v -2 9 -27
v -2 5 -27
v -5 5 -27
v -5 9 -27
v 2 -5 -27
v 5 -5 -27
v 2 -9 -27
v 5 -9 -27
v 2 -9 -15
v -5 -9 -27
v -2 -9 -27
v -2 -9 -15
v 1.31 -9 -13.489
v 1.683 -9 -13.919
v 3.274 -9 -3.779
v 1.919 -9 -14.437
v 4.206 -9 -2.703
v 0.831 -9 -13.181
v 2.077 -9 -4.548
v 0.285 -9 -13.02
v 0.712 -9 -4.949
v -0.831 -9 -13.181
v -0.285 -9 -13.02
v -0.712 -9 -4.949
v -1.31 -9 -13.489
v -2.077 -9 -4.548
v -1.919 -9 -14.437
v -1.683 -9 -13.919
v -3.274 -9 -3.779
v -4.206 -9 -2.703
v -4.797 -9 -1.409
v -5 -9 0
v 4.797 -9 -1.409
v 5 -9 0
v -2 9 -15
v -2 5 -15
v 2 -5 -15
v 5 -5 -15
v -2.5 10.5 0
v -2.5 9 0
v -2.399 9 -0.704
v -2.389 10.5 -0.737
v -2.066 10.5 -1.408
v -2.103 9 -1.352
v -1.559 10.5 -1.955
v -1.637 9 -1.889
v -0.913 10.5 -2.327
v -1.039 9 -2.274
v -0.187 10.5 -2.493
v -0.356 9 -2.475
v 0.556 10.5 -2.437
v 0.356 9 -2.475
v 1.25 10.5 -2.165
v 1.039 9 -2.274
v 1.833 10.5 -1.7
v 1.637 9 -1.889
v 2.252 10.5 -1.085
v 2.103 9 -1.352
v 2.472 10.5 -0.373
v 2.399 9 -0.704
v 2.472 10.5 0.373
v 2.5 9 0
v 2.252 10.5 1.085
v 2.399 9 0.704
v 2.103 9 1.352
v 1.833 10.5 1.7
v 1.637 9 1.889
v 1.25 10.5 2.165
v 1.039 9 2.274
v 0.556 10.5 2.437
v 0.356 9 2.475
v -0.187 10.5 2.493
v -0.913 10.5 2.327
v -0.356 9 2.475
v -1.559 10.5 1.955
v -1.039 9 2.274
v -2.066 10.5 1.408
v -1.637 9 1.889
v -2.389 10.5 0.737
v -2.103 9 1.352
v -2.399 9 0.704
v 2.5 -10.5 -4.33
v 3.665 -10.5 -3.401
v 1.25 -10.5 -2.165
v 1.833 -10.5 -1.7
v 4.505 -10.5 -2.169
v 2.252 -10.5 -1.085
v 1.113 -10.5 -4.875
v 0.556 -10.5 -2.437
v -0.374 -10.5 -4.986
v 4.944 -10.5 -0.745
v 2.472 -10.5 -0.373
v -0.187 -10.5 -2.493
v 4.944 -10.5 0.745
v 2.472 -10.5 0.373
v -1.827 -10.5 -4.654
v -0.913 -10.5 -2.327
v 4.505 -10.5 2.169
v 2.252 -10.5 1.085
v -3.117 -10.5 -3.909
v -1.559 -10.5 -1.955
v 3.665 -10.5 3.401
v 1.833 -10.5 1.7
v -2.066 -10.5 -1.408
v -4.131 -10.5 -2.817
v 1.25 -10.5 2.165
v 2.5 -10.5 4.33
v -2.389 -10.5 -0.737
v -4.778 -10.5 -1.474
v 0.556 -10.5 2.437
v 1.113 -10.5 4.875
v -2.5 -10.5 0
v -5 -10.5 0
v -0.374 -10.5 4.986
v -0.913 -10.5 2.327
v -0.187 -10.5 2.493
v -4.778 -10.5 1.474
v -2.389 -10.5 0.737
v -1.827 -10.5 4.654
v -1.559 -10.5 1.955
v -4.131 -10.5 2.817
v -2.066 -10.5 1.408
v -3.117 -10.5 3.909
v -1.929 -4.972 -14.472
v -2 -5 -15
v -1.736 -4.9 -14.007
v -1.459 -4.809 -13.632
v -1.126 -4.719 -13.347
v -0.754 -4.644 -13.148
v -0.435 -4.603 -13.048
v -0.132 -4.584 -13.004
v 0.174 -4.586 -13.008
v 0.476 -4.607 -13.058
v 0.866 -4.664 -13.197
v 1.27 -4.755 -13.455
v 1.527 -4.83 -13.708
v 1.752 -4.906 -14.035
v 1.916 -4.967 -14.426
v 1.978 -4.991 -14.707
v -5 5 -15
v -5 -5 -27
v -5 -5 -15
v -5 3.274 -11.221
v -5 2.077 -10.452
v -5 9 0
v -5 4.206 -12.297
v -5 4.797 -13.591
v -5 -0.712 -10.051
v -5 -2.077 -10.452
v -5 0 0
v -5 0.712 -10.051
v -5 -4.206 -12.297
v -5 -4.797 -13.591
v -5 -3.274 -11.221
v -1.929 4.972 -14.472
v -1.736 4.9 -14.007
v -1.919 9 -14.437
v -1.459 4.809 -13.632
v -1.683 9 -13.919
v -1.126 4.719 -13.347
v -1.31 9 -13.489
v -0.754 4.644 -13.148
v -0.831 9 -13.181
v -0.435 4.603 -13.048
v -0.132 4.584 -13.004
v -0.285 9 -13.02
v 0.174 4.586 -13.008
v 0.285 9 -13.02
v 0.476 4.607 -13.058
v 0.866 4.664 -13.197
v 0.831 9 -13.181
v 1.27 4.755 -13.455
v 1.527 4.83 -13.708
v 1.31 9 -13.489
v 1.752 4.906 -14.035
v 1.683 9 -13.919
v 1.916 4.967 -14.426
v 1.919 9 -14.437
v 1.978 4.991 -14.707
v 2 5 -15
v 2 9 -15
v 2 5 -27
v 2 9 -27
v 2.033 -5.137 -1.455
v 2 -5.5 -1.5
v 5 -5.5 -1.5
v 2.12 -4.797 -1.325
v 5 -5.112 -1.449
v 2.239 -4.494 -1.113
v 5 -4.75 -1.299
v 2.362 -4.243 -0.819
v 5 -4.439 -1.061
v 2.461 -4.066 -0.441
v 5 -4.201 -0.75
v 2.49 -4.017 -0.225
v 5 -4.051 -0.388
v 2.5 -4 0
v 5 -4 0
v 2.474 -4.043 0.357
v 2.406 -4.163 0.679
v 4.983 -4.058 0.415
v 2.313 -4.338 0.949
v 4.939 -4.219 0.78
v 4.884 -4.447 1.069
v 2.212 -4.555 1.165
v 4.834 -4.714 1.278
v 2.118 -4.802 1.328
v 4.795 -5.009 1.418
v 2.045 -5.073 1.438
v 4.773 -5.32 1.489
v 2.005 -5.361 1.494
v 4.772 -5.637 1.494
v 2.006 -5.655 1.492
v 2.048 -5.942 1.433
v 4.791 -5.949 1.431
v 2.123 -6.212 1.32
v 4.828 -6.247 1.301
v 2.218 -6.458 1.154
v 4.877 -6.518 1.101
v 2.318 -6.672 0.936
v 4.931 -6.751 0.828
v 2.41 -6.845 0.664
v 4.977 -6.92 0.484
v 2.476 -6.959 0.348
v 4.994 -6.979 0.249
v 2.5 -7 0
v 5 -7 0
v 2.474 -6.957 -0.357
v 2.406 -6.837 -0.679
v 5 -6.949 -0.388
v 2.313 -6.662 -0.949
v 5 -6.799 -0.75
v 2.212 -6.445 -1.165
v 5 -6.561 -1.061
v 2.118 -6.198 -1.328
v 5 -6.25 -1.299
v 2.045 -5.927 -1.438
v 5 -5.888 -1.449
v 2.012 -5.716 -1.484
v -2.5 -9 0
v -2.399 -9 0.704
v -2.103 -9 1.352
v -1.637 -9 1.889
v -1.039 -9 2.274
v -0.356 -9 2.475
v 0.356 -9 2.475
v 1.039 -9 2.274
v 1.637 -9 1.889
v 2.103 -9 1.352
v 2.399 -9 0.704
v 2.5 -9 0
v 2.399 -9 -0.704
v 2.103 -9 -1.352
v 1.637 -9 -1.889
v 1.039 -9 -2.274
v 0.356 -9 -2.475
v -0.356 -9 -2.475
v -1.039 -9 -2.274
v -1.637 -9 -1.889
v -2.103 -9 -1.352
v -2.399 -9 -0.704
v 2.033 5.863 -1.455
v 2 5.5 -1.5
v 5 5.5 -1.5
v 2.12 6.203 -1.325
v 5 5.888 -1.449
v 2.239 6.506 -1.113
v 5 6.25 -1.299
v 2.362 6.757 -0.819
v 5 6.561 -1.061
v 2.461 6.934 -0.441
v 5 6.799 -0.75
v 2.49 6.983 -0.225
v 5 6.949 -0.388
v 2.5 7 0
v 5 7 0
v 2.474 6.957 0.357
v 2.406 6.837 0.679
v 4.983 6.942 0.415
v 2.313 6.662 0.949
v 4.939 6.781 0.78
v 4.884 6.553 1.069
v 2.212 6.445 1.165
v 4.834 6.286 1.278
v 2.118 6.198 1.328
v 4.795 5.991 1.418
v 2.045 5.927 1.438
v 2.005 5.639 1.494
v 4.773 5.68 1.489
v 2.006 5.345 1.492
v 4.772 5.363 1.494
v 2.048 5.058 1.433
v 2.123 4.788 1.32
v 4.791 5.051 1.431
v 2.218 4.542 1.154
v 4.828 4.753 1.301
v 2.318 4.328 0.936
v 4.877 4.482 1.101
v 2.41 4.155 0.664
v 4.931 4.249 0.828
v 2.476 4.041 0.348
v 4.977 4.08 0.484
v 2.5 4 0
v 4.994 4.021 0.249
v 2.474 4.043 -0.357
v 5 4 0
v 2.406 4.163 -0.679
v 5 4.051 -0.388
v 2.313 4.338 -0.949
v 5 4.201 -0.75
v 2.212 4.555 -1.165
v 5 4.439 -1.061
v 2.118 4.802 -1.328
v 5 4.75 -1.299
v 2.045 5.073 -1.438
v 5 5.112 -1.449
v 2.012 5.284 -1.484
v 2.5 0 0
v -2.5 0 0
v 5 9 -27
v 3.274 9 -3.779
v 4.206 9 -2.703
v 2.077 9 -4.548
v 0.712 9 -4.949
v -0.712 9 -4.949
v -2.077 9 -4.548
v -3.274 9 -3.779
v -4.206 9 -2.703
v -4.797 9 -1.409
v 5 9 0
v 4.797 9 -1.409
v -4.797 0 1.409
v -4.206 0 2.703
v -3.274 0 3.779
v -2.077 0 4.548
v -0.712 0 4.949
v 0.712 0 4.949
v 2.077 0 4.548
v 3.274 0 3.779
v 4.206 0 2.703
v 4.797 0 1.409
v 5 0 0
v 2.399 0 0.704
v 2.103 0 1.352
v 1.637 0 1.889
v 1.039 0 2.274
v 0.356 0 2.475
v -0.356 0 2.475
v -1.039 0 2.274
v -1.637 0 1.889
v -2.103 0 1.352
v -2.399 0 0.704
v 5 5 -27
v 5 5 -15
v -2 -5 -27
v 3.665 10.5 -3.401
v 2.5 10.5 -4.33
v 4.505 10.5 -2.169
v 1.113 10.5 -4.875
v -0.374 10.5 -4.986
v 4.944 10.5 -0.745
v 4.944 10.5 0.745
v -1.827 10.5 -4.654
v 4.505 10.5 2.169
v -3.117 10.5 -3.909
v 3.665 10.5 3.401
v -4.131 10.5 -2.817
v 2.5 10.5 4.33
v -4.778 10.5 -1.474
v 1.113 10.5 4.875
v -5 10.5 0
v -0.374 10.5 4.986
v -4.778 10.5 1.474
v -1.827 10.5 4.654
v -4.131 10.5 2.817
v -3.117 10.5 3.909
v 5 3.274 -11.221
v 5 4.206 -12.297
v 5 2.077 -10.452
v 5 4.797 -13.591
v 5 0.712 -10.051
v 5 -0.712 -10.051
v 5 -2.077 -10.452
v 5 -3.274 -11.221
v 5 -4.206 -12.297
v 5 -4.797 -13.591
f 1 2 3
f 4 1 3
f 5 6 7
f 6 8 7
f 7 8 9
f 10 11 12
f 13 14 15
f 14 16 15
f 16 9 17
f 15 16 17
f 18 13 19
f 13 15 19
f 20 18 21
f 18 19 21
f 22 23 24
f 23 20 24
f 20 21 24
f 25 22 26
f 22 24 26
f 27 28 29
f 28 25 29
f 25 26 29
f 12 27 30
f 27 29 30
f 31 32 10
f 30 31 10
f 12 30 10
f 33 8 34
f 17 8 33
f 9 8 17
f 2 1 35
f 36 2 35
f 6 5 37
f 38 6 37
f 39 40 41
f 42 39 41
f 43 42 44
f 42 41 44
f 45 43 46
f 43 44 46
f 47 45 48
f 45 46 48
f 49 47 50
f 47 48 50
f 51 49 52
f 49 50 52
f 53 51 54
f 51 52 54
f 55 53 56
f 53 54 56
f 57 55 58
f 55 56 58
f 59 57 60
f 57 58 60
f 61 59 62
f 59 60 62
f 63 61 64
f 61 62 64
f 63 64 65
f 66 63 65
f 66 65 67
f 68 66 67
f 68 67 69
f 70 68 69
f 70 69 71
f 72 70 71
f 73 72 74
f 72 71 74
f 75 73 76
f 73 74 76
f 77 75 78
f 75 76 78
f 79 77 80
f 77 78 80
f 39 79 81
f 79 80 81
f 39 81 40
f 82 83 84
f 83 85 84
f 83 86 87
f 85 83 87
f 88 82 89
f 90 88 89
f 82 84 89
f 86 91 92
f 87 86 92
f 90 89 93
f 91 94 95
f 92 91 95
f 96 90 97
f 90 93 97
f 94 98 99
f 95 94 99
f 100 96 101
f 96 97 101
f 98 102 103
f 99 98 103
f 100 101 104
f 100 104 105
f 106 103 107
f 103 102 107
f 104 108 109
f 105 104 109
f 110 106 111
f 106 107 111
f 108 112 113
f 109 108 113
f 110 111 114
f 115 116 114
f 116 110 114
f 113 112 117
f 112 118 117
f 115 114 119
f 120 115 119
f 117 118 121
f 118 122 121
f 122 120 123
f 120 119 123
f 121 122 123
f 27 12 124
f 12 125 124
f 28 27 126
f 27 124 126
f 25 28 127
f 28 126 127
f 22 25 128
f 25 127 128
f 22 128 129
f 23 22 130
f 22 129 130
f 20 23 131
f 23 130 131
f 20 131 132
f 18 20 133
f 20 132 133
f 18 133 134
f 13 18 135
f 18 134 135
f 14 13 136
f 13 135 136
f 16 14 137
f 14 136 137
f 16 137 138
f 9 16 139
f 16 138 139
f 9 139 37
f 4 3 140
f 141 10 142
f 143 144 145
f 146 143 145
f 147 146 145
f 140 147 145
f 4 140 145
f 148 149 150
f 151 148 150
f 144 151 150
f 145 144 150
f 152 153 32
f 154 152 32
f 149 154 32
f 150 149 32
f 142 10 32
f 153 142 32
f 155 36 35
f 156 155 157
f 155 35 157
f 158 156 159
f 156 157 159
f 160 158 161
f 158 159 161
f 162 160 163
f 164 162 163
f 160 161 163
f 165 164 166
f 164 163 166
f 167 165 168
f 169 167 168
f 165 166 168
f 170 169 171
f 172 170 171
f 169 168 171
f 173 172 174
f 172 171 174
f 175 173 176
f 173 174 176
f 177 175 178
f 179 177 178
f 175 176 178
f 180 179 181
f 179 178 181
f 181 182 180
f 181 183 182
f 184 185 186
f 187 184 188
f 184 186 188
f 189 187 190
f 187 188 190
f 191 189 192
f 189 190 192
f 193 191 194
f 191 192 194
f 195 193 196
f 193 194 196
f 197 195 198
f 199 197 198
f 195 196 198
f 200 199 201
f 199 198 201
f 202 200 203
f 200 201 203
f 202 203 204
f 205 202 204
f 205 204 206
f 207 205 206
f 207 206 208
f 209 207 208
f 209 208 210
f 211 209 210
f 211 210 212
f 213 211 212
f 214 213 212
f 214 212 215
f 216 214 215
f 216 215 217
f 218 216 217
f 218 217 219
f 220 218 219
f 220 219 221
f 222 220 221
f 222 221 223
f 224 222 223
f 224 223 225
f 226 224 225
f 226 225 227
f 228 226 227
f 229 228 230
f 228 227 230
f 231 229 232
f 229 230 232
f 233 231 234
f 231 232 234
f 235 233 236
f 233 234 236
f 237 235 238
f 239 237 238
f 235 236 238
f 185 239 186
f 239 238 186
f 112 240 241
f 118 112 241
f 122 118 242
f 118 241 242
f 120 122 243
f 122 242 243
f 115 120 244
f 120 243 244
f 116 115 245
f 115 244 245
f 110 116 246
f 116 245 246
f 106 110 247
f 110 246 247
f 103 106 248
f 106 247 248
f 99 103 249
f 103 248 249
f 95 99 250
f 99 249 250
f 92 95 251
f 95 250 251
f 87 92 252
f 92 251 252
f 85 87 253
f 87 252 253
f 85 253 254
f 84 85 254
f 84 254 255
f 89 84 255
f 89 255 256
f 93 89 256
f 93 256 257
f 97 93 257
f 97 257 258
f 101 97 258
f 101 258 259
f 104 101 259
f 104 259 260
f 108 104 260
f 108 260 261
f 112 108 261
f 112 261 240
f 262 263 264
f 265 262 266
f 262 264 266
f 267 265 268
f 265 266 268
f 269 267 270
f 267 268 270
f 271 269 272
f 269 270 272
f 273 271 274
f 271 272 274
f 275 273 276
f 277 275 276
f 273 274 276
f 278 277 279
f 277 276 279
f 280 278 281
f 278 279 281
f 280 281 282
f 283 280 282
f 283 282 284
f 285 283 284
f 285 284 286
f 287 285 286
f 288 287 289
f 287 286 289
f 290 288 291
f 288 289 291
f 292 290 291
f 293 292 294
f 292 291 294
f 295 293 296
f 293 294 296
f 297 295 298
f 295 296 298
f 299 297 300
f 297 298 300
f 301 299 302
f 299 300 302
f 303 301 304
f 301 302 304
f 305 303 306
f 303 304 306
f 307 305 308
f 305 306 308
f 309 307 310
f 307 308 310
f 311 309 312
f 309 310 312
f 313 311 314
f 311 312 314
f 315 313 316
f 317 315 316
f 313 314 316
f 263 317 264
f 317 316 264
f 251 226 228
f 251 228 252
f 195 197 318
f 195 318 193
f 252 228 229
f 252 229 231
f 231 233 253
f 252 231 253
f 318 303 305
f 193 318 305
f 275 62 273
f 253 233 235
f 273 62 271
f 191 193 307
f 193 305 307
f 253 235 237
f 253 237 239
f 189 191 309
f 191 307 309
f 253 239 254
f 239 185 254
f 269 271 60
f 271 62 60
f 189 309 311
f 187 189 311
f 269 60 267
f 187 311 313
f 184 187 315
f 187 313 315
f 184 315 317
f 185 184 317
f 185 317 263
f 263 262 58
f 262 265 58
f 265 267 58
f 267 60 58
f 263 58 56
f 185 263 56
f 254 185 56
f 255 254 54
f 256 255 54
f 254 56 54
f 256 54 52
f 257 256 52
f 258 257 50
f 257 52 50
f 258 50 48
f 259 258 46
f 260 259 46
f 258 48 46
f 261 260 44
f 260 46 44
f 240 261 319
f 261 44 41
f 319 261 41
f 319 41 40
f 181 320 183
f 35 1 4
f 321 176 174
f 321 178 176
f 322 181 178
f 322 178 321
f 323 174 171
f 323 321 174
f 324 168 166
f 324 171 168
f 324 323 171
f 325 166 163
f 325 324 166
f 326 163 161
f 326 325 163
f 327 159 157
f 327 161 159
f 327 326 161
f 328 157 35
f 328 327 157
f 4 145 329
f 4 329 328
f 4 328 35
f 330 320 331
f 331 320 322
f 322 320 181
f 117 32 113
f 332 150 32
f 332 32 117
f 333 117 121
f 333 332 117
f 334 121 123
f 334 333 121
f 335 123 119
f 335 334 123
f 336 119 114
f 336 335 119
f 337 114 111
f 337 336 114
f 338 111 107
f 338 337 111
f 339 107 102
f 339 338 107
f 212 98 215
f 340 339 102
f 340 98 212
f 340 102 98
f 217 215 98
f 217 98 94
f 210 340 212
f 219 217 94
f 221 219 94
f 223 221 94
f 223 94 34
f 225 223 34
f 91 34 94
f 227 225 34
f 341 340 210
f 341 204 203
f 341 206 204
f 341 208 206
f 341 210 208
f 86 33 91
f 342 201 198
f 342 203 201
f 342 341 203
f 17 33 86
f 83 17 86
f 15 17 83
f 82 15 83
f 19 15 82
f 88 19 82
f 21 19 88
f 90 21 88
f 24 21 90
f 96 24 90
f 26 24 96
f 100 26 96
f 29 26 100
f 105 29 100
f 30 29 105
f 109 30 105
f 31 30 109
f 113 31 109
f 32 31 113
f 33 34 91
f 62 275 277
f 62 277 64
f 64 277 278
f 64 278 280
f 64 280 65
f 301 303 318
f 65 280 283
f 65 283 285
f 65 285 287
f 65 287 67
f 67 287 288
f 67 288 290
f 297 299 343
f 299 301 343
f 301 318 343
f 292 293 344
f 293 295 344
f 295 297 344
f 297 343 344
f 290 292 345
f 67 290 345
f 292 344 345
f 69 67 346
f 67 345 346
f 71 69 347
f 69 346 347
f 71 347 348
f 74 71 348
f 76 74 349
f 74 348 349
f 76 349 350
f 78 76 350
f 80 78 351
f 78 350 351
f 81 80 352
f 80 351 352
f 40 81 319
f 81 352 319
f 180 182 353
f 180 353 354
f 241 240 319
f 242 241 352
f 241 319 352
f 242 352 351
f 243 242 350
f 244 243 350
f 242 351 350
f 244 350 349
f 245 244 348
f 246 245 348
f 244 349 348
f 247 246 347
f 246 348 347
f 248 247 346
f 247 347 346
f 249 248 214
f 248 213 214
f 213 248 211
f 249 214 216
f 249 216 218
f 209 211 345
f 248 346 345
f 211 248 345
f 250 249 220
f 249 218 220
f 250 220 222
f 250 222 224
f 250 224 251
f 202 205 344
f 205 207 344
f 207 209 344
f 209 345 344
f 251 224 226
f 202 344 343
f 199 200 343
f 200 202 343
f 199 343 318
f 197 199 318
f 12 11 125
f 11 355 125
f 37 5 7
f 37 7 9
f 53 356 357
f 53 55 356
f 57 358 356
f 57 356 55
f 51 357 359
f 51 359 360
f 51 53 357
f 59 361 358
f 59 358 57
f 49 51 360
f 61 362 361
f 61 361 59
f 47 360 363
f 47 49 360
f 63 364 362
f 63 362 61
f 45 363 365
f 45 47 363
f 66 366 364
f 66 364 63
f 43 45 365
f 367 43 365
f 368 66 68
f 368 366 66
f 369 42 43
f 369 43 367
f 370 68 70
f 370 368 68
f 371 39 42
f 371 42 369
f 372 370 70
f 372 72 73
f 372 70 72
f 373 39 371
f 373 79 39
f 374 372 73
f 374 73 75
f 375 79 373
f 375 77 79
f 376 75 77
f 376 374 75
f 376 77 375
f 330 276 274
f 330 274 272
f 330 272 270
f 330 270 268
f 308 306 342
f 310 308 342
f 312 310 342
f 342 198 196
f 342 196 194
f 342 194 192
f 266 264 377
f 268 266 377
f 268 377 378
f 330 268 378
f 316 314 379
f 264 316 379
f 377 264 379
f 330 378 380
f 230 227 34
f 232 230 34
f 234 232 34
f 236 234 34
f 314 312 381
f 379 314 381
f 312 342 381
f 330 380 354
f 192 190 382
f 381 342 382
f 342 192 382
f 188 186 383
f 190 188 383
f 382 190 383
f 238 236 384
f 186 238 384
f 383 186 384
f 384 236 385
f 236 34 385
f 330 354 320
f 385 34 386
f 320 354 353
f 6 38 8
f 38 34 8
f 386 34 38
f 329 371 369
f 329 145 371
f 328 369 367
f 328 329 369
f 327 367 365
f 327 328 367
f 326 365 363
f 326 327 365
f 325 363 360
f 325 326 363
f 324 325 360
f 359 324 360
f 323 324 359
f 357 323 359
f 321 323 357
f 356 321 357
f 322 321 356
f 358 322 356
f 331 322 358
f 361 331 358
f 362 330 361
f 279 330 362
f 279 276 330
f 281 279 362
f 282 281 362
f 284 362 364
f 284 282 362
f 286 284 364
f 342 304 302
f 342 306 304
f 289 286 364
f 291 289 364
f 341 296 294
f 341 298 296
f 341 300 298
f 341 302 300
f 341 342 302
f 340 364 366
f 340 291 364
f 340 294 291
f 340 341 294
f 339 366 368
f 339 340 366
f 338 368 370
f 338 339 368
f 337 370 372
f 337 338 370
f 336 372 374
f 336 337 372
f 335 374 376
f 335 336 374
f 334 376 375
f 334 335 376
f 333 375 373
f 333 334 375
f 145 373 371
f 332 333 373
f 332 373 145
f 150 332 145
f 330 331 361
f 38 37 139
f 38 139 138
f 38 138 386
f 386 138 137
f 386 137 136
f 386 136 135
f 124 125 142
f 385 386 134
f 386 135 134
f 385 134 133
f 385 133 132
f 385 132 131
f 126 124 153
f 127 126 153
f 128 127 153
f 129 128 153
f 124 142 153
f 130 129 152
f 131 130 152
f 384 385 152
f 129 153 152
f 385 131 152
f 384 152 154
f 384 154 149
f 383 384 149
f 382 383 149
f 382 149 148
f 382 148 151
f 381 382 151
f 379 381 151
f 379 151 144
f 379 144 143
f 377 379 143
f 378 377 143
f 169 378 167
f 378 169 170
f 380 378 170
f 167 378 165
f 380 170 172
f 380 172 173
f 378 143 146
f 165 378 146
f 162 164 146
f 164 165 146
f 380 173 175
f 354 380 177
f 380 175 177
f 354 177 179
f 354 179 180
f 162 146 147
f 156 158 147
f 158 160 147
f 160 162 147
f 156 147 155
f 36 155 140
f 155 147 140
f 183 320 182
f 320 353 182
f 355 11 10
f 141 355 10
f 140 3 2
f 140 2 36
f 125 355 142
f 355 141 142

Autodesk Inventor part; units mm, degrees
ref_plane "YZ Plane" through (0, 0, 0) normal (1, 0, 0) x (0, 1, 0)
ref_plane "XZ Plane" through (0, 0, 0) normal (0, 1, 0) x (-1, 0, 0)
ref_plane "XY Plane" through (0, 0, 0) normal (0, 0, 1) x (1, 0, 0)
sketch "Sketch1" plane through (0, 0, 0) normal (0, 1, 0) x (-1, 0, 0)
  circle A0 centre (0, 0) radius 5
  circle A1 centre (0, 0) radius 2.5
extrude "Extrusion1" add sketch "Sketch1" along normal mid plane 21
sketch "Sketch2" plane through (0, 0, 0) normal (0, 1, 0) x (-1, 0, 0)
  circle A0 centre (0, 0) radius 5 construction
  line L0 (5, 0) -> (5, -27) construction
  line L1 (5, 0) -> (-5, 0)
  line L2 (-5, 0) -> (-5, -27)
  line L3 (-5, -27) -> (5, -27)
  line L4 (5, -27) -> (5, 0)
  dimension "d4" = 27
extrude "Extrusion2" add sketch "Sketch2" along normal mid plane 18
sketch "Sketch3" plane through (0, 9, 0) normal (0, 1, 0) x (1, 0, 0)
  circle A0 centre (0, 0) radius 2.5
extrude "Extrusion3" cut sketch "Sketch3" against normal blind 18
sketch "Sketch4" plane through (0, 9, 0) normal (0, 1, 0) x (1, 0, 0)
  line L0 (5, 0) -> (5, 27) projected
  arc A0 (-2, 15) -> (2, 15) centre (0, 15) ccw
  line L1 (2, 27) -> (2, 15)
  line L2 (-2, 27) -> (-2, 15)
  line L3 (2, 27) -> (-2, 27)
  line L4 (5, 27) -> (-5, 27) projected
  point P0 (0, 0)
extrude "Extrusion4" cut sketch "Sketch4" against normal through all
sketch "Sketch5" plane through (-5, -9, 0) normal (-1, 0, 0) x (0, 0, 1)
  line L0 (-27, 18) -> (-27, 14) construction
  line L1 (-27, 14) -> (-27, 4)
  line L2 (-27, 0) -> (-27, 18) projected
  line L3 (-27, 9) -> (-10, 9) construction
  arc A0 (-15, 4) -> (-15, 14) centre (-15, 9) ccw
  line L4 (-27, 14) -> (-15, 14)
  line L5 (-27, 4) -> (-15, 4)
  point P0 (0, 9)
  dimension "d16" = 10
  dimension "d17" = 17
extrude "Extrusion5" cut sketch "Sketch5" against normal through all
sketch "Sketch7" plane through (5, -9, 0) normal (1, 0, 0) x (0, 0, -1)
  line L0 (-5, -1.5) -> (5, -1.5) construction
  line L1 (0, -1.5) -> (0, 3.5) construction
  line L2 (0, 0) -> (0, 18) construction
  line L3 (5, 19.5) -> (-5, 19.5) construction
  line L4 (0, 19.5) -> (0, 14.5) construction
  circle A0 centre (0, 3.5) radius 1.5
  circle A1 centre (0, 14.5) radius 1.5
  point P0 (0, 9)
  dimension "d28" = 5
  dimension "d29" = 5
  dimension "d30" = 3
  dimension "d31" = 3
extrude "Extrusion7" cut sketch "Sketch7" against normal up to surface
properties part number "Forcella"
